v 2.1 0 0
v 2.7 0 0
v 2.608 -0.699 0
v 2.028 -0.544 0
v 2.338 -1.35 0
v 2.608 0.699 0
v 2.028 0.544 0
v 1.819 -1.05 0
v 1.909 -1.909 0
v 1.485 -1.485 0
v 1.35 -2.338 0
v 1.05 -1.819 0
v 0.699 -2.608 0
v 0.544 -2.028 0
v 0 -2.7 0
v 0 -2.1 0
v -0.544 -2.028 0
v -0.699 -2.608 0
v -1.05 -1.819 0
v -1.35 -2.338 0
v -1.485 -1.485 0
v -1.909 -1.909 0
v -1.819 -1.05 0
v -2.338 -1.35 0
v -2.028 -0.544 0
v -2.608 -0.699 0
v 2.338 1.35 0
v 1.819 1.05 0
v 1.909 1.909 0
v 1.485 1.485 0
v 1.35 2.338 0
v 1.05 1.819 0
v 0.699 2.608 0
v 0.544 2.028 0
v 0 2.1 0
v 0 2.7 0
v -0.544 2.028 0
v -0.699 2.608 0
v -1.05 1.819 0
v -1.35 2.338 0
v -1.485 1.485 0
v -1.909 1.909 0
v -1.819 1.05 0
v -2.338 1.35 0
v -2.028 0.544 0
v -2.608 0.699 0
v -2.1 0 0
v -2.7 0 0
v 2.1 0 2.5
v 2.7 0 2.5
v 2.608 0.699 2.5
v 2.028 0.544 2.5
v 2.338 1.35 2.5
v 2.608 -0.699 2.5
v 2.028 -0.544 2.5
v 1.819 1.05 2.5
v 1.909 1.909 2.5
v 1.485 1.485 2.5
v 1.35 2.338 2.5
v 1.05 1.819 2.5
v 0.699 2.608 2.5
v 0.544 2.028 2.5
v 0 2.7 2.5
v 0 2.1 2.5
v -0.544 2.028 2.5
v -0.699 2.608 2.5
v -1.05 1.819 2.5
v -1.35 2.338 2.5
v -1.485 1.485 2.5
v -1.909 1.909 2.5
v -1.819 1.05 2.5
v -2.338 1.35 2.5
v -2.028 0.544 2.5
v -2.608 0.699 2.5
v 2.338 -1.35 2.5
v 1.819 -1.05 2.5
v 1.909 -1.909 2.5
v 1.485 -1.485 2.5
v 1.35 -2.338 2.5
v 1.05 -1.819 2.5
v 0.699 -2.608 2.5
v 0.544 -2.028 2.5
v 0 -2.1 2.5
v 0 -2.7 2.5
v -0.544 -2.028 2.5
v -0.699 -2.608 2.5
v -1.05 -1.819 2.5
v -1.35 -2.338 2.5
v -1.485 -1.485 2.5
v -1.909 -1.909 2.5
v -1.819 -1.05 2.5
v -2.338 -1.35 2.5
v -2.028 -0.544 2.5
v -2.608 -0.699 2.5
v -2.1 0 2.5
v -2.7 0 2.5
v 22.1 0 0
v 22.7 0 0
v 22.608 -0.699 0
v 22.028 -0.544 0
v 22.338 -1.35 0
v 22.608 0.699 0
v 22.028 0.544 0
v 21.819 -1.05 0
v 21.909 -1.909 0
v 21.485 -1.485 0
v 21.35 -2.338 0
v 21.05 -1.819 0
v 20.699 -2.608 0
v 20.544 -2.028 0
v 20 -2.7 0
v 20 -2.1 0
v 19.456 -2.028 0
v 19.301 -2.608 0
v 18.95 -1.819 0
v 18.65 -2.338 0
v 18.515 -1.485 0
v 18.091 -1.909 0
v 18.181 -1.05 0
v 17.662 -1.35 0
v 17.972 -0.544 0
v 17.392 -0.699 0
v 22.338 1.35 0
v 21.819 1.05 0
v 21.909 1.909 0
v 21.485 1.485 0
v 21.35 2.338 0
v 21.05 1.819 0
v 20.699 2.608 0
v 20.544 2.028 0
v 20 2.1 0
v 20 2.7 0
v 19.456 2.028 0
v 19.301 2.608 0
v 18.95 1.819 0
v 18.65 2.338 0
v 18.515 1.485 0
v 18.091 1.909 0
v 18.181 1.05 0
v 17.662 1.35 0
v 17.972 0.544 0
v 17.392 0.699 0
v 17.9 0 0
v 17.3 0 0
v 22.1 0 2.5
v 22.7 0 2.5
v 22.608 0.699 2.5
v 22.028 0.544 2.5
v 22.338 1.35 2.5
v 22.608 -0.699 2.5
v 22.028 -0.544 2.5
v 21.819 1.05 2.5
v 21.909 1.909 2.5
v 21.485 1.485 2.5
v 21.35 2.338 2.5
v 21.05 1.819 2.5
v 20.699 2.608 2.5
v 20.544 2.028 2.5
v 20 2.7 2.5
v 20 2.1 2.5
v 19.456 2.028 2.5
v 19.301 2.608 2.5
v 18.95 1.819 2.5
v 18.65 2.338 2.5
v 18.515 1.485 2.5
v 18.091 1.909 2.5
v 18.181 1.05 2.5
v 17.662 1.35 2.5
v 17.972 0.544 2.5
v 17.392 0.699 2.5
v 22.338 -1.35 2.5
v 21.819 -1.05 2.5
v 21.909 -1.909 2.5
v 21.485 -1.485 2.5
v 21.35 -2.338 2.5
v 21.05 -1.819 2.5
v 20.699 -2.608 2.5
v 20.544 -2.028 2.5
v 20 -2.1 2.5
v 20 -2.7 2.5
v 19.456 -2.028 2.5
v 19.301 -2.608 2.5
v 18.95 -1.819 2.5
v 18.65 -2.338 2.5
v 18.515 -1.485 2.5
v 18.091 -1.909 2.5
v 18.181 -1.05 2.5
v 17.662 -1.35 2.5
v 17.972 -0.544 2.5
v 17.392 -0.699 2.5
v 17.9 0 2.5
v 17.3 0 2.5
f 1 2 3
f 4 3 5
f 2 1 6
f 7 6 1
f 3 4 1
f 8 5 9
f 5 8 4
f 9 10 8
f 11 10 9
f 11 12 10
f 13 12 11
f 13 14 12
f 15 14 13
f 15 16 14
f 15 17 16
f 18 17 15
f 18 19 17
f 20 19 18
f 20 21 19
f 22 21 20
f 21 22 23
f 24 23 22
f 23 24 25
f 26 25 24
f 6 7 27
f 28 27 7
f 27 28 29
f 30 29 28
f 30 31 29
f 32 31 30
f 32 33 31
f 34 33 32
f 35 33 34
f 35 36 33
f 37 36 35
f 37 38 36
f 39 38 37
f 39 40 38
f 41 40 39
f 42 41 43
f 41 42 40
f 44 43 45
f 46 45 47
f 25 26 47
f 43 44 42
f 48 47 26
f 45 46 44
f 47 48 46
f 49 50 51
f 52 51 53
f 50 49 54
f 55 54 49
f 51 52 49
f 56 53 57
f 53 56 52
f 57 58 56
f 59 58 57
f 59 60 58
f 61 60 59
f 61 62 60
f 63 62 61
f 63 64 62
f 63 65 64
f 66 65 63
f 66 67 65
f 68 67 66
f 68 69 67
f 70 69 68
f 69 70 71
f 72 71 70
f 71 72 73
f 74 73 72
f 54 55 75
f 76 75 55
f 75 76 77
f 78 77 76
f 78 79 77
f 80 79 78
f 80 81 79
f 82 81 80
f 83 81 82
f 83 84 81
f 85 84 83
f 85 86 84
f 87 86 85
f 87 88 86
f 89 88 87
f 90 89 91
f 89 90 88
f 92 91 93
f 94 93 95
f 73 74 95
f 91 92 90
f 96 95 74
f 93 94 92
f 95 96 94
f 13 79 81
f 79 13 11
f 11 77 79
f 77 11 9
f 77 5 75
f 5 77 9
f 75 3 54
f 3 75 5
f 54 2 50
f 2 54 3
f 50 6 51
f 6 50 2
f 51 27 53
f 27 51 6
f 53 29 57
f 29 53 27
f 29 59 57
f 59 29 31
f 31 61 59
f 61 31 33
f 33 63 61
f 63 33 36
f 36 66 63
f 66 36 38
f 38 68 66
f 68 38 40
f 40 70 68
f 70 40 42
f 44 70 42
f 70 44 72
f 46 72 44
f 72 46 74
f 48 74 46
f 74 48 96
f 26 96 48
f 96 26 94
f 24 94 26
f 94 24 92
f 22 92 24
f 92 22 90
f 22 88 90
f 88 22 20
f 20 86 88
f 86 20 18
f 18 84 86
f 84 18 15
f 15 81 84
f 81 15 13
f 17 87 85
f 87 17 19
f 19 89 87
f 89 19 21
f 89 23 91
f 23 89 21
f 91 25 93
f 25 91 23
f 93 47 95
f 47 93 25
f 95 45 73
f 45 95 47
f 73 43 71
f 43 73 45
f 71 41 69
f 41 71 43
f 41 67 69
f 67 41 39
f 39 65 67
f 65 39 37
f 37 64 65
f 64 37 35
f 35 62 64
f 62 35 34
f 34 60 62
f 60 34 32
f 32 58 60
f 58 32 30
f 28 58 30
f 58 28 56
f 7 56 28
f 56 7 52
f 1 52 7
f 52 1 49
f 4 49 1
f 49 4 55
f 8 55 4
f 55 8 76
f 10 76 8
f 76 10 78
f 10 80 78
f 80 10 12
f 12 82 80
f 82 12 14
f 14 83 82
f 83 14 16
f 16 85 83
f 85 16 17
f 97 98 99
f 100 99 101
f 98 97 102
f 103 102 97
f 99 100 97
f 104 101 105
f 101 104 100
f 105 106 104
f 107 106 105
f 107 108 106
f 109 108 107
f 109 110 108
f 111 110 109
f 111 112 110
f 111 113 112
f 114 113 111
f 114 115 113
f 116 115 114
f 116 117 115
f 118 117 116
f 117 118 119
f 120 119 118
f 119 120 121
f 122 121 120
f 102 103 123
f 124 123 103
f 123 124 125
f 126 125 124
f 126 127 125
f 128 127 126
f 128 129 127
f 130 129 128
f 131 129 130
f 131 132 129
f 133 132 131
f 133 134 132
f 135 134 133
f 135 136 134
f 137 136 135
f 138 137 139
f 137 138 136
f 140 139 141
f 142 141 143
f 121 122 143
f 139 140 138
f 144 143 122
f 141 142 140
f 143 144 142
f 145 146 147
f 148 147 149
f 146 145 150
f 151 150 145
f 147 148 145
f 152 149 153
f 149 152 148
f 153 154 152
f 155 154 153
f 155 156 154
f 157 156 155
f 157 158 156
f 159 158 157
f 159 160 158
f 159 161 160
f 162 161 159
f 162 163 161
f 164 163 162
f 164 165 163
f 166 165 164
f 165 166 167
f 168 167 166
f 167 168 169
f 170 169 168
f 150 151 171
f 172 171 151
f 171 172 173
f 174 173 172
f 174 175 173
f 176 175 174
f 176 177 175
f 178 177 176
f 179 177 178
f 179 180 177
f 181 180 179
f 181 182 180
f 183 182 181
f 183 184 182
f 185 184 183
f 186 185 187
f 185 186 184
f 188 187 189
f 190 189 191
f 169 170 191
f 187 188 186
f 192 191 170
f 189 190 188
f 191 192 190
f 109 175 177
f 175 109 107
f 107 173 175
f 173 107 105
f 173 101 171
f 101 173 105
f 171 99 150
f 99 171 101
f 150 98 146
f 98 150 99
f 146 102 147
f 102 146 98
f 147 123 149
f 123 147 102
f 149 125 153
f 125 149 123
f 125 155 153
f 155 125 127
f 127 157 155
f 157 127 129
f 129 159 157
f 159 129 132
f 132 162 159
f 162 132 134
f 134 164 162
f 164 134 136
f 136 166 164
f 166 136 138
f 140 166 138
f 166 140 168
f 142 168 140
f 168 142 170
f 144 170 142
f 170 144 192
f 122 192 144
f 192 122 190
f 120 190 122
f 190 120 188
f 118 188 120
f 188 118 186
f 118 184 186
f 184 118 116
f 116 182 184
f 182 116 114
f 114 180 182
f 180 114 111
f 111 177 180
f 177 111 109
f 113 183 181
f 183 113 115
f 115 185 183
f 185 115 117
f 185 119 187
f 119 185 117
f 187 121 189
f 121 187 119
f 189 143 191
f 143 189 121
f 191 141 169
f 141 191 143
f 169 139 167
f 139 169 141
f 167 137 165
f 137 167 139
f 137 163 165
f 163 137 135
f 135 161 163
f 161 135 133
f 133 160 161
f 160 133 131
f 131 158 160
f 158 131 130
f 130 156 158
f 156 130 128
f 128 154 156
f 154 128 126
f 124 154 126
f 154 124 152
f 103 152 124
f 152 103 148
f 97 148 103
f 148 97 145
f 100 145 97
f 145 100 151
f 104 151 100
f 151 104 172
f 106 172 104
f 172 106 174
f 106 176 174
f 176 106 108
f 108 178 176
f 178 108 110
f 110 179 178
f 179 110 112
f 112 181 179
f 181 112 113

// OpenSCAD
// file: lib/lin.scad
//put n children along dir dividing size in equal spacing 
//leaving first as space before and last as space after
module linv(dir=[1,0,0], n=2, size=10, width=1, first=0, last=0){
  vfirst = dir * first + dir*width/2;
  n1 = n-1;
  dx = (size - (first + last + width)) / n1;

  translate(vfirst)
  for(i = [0:n1]){
    translate(dir * i * dx)
      children();
  }
}

//put n children along dir leaving spacing between each and
//leaving first as space before 
module linvs(dir=[1,0,0], n=2, spacing=5, width=0, first=0){
  vfirst = dir * first + dir*width/2;
  n1 = n-1;
  dx = spacing + width;

  translate(vfirst)
  for(i = [0:n1]){
    translate(dir * i * dx)
      children();
  }
}

function linsv_size(n=2, spacing=0, width=0, first=0) = 
  first + n * width + (n -1) * spacing;

module lin_demo(){

  cylinder(r=.1, h=1);
  translate([10,0,0])
  cylinder(r=.1, h=1);

  linv(n=5, size=10)
    cube([1,1,1], center=true);
}

module linrot(angs=[0,90], axis=[0,0,1], n=5, radius=50){
  ang = (angs[1] - angs[0])/n;
  for(i = [0:n]){
    translate([      
      radius * cos(i * ang + angs[0]),
      radius * sin(i * ang + angs[0]),
      0])
    rotate(axis * (i * ang + angs[0]))
    children();
  }
}

function nw_radius(n, w, ang=90) = 
    sqrt( (w ^2) / (2 * (1 - cos(ang / n))));
// file: lib/func.scad
//functions modules
//short names to functions

module tr(x= 0, y = 0, z = 0){
  translate([x, y, z]) children();
}

module trv(v){
  translate(v) children();
}

module rot(x = 0, y = 0, z = 0){
  rotate([x, y, z]) children();
}

module rotv(v){
  translate(v) children();
}

module mir(x = 0, y = 0, z = 0){
  mirror([x, y, z]) children();
}

module mirv(v){
  mirror(v) children();
}

module mirx(){
  mirror([1,0,0]) children();
}

module miry(){
  mirror([0,1,0]) children();
}

module mir2(){
  mirror([1,0,0]) children();
  children();
}

module mir4(){
  mir2() children();
  mirror([0,1,0])
  mir2() children();
}

function vec(x=0,y=0,z=0) = [x, y, z];
function vecc(src=[0,0,0], x=false,y=false,z=false) = 
  [x ? x :src.x, y ? y : src.y, z ? z: src.z];

//base vectors
vecx = [1, 0, 0];
vecy = [0, 1, 0];
vecz = [0, 0, 1];
// main file
include <lib/func.scad>
include <lib/lin.scad>

/**
Project 
Description
Author  
*/



build();

//parte
size = [10,10,10];

ph = .3;

$fn=24;

module build(){
  parte();
}

//parte:
module parte(){
  //a:
  module a(){
    
    d = [6.5, 10, .9];
    c = 4.2;
    
    cube(d, center=true);
    cube(10, center=true);
    
    d = [6.5, 10, s];
    c = vecc(d, x=4.2, y=8);
    
    tr(z=s/2)
    difference(){      
      cube(d, center=true);
      tr(y=-1)
      cube(c, center=true);
    }
  }
  
  //b:
  module b(){
    dr = 4.2/2;
    er = dr +.6;
    
    linear_extrude(2.5)
    difference(){
      circle(er);
      circle(dr);
    }
    
  }
  
  //c:
  module c(){
  
  }
  linv(dir=[1,0,0], n=2, size=20, width=0, first=0, last=0) {
  /*
  
  {
  tr(x=10){
    a(.9);
    tr(y=20)
    a(1.2);
    tr(y=40)
    a(1.5);
  }
  */
    
  b();
  }
  
  
  
  
  c();
}
